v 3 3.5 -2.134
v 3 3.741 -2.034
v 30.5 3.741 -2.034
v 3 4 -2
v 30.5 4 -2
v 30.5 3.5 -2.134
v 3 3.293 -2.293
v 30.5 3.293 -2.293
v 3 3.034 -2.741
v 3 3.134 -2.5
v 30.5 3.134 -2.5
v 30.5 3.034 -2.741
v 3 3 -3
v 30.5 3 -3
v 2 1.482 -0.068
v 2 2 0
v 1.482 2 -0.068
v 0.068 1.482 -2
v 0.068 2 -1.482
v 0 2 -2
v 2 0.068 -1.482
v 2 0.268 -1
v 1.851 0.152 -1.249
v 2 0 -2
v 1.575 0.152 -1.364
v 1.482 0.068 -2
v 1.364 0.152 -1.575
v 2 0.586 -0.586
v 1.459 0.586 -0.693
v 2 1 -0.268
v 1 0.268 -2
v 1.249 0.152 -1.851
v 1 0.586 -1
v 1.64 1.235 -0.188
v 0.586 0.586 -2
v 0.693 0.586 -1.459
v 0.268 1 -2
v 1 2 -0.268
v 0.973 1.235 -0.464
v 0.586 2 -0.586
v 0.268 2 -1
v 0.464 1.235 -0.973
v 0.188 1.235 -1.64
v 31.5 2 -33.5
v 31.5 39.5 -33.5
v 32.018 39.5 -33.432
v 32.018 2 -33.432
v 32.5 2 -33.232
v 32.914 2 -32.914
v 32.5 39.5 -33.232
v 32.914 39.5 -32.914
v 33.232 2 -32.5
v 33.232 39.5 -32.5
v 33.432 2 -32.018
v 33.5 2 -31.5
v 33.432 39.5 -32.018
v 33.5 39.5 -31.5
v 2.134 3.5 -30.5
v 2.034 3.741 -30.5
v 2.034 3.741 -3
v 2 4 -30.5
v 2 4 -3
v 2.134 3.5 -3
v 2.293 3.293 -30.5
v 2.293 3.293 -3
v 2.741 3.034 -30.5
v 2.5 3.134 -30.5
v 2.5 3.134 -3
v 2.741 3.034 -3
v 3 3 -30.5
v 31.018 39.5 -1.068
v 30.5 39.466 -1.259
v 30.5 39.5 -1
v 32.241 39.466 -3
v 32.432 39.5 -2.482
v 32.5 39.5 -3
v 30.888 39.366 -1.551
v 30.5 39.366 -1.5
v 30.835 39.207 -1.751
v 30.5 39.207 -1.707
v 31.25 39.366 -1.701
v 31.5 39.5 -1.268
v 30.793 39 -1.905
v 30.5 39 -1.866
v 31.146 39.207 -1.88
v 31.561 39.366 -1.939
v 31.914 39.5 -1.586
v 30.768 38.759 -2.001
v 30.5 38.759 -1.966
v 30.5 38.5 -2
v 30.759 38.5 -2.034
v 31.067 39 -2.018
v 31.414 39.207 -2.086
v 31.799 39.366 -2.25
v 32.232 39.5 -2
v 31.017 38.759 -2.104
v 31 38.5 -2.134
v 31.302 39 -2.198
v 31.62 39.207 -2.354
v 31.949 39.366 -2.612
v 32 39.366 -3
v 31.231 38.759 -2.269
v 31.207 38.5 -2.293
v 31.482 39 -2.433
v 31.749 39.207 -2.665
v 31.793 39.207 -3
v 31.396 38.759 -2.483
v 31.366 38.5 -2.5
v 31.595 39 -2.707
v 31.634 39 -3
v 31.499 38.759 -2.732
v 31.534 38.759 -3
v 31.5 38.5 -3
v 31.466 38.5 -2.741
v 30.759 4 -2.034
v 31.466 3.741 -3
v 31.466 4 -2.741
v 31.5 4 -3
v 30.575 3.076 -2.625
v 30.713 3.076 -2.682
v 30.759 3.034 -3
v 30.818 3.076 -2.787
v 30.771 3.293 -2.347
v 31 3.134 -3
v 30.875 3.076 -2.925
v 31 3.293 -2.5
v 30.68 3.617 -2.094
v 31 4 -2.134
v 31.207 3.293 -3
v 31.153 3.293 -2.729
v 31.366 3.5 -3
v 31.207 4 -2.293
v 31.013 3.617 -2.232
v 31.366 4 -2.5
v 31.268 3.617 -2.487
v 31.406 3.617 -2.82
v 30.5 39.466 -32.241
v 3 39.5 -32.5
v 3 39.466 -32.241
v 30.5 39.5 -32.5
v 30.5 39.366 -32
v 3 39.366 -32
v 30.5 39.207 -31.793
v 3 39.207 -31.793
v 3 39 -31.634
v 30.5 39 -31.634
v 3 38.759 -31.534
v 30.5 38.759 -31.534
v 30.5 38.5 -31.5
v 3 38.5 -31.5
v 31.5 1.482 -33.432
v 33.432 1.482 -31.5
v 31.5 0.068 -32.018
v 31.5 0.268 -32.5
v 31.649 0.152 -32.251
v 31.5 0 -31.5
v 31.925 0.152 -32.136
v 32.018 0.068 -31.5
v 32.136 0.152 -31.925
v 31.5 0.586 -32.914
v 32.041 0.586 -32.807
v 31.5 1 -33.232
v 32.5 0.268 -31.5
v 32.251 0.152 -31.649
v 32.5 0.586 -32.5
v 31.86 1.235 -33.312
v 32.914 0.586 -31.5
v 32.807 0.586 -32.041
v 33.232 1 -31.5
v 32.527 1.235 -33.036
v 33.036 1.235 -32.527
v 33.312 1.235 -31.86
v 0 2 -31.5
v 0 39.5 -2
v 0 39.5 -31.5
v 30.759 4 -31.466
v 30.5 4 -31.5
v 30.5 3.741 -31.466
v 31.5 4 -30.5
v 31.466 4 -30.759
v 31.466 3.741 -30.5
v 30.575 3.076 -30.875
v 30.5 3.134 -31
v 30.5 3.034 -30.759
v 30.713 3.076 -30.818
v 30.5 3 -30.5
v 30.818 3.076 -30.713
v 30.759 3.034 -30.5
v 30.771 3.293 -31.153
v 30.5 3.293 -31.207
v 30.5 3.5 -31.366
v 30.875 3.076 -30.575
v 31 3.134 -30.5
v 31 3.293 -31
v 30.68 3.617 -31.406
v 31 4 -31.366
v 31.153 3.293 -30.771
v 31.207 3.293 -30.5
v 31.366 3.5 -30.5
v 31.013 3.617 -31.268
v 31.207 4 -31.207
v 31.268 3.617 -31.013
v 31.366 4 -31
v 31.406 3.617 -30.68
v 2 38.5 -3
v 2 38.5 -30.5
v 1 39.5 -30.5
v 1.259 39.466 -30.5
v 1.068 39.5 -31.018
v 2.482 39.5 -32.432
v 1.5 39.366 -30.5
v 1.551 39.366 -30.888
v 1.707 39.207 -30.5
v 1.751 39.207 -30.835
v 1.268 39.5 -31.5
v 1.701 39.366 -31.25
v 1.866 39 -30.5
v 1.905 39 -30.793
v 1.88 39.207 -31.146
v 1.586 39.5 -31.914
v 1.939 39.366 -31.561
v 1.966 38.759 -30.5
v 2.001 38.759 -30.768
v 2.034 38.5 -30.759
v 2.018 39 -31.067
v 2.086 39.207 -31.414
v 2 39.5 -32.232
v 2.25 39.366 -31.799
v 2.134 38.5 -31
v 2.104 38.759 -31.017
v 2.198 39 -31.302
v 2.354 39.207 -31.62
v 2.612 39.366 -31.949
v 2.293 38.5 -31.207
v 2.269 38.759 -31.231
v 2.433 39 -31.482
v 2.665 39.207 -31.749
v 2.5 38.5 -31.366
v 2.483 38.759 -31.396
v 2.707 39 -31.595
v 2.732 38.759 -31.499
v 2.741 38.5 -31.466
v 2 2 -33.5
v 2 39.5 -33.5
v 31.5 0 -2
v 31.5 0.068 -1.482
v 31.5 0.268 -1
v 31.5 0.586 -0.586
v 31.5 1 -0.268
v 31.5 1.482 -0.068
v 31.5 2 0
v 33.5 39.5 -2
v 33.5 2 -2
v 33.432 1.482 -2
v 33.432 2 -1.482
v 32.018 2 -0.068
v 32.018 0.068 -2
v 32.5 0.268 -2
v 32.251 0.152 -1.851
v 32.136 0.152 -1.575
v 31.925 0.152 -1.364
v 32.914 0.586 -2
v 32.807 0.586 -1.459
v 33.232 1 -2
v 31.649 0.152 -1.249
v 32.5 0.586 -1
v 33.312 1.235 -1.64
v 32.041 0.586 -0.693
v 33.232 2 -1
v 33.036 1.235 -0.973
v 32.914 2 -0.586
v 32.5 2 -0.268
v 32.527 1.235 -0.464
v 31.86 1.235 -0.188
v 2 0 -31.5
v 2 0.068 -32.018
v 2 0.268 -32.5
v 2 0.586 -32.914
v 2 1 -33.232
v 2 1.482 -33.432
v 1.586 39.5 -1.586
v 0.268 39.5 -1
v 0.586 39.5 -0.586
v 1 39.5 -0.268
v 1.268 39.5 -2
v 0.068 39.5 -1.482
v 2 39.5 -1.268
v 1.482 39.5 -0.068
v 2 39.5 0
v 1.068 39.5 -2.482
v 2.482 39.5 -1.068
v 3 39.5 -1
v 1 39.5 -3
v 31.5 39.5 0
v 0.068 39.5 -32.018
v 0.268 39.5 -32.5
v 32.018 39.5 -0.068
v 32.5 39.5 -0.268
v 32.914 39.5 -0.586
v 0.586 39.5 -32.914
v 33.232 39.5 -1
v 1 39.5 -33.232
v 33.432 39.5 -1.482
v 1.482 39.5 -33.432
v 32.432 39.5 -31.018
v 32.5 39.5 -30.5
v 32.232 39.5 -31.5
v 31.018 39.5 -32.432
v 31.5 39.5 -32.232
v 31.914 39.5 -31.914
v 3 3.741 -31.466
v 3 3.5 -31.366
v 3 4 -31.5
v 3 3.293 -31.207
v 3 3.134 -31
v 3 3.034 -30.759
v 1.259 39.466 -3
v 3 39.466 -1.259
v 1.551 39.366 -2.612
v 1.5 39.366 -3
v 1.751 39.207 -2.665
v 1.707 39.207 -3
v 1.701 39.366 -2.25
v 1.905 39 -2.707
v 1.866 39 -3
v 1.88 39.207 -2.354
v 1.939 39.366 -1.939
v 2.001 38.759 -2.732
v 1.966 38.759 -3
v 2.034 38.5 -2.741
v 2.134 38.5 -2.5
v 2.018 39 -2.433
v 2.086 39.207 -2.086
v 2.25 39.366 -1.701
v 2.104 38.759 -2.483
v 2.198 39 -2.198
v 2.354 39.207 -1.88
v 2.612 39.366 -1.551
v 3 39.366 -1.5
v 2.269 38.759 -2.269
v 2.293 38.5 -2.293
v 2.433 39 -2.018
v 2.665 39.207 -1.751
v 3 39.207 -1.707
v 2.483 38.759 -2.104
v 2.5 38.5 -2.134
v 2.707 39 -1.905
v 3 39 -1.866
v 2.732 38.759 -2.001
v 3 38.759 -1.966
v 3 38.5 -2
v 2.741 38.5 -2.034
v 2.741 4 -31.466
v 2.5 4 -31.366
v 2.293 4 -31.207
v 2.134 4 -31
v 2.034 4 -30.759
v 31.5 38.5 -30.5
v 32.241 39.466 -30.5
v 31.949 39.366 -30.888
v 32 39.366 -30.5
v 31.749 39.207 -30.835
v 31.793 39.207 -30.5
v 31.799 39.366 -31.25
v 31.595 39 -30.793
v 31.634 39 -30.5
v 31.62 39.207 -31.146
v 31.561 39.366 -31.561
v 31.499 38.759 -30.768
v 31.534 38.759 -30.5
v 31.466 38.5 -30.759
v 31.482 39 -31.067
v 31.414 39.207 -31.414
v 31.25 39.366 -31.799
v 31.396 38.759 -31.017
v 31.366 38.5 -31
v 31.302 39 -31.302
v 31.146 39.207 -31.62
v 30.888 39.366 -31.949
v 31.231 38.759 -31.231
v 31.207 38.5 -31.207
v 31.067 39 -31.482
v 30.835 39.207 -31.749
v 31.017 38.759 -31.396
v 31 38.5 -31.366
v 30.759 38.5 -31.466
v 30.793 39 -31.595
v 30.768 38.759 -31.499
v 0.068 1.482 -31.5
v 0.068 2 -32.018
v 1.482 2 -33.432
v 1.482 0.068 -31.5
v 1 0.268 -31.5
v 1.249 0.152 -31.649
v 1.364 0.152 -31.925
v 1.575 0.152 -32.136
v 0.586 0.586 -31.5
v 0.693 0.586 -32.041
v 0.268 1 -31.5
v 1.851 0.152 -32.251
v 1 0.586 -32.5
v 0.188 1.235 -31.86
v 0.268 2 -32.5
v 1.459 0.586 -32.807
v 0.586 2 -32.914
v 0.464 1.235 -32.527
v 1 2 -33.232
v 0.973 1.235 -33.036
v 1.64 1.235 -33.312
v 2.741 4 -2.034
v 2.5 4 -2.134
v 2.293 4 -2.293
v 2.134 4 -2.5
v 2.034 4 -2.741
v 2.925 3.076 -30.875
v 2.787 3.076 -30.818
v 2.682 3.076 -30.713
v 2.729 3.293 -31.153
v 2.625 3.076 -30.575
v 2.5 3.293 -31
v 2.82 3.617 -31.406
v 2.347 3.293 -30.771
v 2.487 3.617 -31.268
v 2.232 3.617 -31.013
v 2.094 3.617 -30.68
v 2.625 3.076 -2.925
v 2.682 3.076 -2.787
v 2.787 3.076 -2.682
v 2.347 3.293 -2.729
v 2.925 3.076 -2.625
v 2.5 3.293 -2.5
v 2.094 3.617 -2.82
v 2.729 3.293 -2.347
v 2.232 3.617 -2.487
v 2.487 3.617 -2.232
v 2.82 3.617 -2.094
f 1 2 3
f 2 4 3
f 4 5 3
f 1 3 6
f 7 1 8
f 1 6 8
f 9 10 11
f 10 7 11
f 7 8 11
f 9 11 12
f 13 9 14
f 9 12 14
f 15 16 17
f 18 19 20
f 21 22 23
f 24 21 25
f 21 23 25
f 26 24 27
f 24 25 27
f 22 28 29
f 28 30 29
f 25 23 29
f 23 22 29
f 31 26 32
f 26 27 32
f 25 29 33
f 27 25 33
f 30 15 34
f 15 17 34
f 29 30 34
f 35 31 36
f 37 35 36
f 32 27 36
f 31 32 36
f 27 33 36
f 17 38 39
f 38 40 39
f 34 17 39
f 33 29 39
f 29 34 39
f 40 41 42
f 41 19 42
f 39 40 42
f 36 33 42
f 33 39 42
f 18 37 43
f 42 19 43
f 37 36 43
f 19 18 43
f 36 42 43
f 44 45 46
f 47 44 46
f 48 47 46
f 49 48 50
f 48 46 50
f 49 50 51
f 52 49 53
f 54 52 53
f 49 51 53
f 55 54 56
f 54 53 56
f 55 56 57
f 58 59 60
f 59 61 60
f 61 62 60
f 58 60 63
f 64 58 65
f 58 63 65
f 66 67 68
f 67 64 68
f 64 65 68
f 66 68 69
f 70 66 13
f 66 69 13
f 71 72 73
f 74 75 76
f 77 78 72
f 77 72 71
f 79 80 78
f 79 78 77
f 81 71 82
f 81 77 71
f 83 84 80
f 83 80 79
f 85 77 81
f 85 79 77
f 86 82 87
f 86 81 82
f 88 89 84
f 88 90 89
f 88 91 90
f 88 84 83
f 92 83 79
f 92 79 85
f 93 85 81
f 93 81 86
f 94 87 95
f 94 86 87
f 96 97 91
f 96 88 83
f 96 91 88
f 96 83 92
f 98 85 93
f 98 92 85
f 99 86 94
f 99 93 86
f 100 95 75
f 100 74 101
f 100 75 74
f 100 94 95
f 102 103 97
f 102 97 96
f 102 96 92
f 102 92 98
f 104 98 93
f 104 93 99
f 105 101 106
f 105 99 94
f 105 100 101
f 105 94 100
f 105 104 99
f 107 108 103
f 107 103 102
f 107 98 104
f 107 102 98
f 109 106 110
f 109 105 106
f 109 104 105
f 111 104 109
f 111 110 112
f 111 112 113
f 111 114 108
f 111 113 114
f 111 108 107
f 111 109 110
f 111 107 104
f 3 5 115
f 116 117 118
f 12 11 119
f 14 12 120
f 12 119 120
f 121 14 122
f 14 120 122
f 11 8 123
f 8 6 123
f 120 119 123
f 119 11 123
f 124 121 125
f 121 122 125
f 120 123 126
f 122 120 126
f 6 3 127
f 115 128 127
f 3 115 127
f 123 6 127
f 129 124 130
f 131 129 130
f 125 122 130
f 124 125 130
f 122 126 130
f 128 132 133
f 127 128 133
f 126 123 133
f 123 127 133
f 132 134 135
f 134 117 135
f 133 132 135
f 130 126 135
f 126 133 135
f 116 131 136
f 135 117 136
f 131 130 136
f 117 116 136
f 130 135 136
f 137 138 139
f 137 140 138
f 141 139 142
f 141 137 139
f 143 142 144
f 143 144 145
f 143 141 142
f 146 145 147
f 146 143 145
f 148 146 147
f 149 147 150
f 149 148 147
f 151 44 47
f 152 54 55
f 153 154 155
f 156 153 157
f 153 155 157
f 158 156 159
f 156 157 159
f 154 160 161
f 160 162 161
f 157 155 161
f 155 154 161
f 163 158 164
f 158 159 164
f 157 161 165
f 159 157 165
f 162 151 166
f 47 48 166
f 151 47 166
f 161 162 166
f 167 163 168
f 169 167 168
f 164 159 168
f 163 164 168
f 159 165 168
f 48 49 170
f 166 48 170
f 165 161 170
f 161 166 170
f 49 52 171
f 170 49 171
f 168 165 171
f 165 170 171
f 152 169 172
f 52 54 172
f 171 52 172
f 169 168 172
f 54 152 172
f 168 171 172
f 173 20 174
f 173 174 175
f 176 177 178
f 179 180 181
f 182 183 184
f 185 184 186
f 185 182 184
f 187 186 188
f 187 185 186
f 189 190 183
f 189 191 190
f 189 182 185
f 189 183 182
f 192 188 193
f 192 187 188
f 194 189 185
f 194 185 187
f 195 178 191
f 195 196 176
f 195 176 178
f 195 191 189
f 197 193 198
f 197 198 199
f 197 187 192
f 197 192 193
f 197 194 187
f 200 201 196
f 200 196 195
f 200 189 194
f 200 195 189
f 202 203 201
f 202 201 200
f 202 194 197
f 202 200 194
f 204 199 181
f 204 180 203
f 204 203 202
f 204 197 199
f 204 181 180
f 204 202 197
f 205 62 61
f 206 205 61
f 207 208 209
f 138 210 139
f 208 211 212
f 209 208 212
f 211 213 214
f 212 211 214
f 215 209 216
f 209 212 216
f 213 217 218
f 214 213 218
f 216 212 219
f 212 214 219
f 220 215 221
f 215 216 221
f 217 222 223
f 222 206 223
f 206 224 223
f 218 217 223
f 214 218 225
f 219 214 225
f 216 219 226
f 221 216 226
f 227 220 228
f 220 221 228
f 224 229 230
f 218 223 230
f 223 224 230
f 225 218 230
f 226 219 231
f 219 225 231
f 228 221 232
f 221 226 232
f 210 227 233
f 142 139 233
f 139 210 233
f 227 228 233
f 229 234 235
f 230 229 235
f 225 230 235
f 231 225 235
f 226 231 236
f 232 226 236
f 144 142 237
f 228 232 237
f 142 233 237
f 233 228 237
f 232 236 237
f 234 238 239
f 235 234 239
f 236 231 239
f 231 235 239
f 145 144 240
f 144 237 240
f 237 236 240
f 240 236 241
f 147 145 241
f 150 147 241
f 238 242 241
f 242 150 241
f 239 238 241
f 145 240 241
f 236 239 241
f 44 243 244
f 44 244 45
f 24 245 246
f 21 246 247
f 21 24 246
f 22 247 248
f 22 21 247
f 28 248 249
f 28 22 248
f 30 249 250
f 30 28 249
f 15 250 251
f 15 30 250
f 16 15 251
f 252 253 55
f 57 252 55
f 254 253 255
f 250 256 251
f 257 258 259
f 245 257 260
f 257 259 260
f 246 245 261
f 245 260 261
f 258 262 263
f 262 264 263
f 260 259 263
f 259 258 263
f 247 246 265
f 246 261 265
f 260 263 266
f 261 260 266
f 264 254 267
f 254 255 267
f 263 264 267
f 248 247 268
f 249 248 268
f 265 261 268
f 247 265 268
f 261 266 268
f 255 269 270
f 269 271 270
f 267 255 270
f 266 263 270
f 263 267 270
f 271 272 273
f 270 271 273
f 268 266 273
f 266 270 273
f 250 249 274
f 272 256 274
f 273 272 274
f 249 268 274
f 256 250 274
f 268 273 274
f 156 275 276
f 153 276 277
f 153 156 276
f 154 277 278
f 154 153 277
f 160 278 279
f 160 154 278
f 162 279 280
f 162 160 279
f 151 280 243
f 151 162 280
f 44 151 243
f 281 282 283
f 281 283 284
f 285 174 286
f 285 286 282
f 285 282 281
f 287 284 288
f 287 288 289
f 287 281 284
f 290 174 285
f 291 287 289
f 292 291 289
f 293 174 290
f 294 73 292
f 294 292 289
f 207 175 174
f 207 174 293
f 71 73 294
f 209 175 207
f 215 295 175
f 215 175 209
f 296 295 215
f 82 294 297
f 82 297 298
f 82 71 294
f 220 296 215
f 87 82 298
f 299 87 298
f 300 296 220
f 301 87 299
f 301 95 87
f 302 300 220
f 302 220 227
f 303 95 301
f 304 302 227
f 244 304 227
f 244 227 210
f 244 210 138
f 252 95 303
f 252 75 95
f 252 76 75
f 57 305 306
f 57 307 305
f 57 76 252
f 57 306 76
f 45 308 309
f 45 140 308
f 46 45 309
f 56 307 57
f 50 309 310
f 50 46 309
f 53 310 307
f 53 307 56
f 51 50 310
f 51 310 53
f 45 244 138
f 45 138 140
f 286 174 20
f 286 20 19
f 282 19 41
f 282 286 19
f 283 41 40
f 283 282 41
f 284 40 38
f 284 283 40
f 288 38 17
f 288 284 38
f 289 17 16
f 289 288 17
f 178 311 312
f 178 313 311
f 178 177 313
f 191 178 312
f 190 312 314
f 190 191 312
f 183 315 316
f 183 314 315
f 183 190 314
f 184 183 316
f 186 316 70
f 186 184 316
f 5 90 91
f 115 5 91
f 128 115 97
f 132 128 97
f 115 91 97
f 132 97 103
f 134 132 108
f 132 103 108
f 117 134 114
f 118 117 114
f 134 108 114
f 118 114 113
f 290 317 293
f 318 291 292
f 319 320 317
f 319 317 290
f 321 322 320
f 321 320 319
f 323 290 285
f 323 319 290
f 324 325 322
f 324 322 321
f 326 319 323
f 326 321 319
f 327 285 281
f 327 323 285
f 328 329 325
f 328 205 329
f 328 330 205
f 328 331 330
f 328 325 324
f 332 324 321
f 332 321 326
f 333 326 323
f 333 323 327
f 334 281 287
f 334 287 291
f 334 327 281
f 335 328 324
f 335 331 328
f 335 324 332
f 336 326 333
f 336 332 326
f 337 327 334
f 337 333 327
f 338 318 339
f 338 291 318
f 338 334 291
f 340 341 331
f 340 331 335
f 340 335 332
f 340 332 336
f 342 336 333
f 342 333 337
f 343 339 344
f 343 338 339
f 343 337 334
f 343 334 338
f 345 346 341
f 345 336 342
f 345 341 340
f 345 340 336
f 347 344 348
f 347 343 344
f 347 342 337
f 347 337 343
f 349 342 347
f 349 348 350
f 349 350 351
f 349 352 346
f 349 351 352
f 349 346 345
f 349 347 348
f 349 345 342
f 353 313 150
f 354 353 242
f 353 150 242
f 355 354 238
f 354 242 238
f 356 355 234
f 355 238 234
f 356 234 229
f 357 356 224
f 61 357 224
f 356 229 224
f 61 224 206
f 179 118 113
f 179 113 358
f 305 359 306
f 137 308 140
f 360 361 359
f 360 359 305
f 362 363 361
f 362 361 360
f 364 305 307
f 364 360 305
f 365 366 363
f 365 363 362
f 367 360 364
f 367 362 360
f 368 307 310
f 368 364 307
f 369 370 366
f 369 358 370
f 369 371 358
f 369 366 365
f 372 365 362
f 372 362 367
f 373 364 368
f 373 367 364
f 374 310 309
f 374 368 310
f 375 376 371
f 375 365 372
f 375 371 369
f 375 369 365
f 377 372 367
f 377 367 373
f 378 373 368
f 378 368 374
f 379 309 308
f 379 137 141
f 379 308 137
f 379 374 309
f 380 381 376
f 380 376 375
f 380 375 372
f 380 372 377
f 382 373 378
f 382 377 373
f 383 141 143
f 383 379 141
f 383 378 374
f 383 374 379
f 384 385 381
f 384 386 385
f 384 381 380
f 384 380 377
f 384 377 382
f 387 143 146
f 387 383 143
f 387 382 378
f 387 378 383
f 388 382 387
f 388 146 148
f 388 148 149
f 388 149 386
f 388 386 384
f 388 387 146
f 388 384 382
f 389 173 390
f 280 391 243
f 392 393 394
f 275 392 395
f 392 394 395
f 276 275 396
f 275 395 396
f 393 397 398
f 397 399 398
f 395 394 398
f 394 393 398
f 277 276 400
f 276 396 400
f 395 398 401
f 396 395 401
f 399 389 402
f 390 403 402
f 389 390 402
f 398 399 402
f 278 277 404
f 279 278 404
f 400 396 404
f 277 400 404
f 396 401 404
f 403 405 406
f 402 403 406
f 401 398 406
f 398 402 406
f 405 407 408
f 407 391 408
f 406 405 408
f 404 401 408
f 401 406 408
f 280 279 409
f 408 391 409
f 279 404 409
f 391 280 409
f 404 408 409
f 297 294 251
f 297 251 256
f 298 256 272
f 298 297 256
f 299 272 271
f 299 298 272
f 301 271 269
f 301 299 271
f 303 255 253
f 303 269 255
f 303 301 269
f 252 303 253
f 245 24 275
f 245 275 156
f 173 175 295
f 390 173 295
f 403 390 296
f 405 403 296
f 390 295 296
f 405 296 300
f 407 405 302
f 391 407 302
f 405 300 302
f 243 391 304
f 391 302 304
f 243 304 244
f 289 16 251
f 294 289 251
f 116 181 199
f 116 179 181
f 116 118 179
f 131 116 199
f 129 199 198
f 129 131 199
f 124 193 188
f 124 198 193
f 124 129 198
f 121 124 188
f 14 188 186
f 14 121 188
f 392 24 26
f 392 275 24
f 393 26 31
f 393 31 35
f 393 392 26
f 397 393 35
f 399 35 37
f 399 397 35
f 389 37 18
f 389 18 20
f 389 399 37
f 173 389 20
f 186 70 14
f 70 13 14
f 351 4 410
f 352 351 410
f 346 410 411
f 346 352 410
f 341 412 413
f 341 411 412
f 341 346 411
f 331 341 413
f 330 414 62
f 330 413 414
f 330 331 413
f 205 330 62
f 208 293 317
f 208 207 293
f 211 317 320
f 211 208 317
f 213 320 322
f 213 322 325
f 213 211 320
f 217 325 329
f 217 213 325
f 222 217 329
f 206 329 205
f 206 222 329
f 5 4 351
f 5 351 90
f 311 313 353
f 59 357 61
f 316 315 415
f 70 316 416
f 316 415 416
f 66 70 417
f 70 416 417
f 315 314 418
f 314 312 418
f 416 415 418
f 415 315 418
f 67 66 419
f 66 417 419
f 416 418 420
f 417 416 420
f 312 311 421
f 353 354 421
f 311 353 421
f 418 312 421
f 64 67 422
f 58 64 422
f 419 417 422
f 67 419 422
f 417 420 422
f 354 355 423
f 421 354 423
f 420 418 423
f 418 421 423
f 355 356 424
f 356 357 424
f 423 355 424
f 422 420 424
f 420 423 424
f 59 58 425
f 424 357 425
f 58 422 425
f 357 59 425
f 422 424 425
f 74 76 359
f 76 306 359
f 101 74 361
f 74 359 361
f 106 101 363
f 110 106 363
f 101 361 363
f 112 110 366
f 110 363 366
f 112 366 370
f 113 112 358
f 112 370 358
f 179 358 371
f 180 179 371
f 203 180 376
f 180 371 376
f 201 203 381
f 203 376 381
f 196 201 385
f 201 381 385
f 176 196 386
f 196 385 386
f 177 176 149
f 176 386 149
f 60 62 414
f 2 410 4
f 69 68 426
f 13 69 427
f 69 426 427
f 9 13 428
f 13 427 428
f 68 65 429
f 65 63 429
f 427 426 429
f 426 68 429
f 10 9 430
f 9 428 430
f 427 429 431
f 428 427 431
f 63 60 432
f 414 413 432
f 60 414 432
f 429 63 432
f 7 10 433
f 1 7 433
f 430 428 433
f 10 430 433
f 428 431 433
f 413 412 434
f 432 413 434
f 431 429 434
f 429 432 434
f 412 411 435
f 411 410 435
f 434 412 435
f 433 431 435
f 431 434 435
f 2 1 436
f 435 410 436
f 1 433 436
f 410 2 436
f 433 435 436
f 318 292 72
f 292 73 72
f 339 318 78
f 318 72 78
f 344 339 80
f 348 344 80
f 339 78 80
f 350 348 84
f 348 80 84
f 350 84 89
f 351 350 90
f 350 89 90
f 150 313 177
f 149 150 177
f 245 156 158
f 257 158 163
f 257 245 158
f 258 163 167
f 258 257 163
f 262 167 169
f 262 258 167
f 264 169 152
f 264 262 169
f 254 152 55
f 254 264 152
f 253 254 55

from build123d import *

# Parameters (mm, degrees)
SKETCH1_W           = 33.5
SKETCH1_H           = 33.5
SKETCH1_W_2         = 29.5
SKETCH1_H_2         = 29.5
BOSS_EXTRUDE1_DEPTH = 39.5
SKETCH2_W           = 29.5
SKETCH2_H           = 29.5
BOSS_EXTRUDE2_DEPTH = 3
FILLET_1_R          = 2
FILLET_2_R          = 2
FILLET_3_R          = 1


with BuildPart() as part:
    # Sketch1 → Boss-Extrude1 (new body)
    with BuildSketch(Plane(origin=(0, 0, 0), x_dir=(1, 0, 0), z_dir=(0, 1, 0))):
        with Locations((16.75, 16.75)):
            Rectangle(SKETCH1_W, SKETCH1_H)
        with Locations((16.75, 16.75)):
            Rectangle(SKETCH1_W_2, SKETCH1_H_2, mode=Mode.SUBTRACT)
    extrude(amount=BOSS_EXTRUDE1_DEPTH)

    # Sketch2 → Boss-Extrude2 (add)
    with BuildSketch(Plane.XZ):
        with Locations((16.75, -16.75)):
            Rectangle(SKETCH2_W, SKETCH2_H)
    extrude(amount=-BOSS_EXTRUDE2_DEPTH)

    # Скругление1
    fillet_1_edges = [part.edges().sort_by_distance(p)[0] for p in [
        (0, 19.75, -33.5),
        (33.5, 19.75, -33.5),
        (33.5, 19.75, 0),
        (0, 19.75, 0),
    ]]
    fillet(fillet_1_edges, radius=FILLET_1_R)

    # Скругление2
    fillet_2_edges = [part.edges().sort_by_distance(p)[0] for p in [
        (0, 0, -16.75),
        (16.75, 0, -33.5),
        (33.5, 0, -16.75),
        (16.75, 0, 0),
        (32.914213562, 0, -0.585786438),
        (32.914213562, 0, -32.914213562),
        (0.585786438, 0, -0.585786438),
        (0.585786438, 0, -32.914213562),
    ]]
    fillet(fillet_2_edges, radius=FILLET_2_R)

    # Скругление3
    fillet_3_edges = [part.edges().sort_by_distance(p)[0] for p in [
        (2, 21.25, -31.5),
        (2, 21.25, -2),
        (31.5, 21.25, -2),
        (31.5, 21.25, -31.5),
        (2, 39.5, -16.75),
        (16.75, 39.5, -2),
        (31.5, 39.5, -16.75),
        (16.75, 39.5, -31.5),
        (16.75, 3, -31.5),
        (2, 3, -16.75),
        (16.75, 3, -2),
        (31.5, 3, -16.75),
    ]]
    fillet(fillet_3_edges, radius=FILLET_3_R)


solid = part.part
